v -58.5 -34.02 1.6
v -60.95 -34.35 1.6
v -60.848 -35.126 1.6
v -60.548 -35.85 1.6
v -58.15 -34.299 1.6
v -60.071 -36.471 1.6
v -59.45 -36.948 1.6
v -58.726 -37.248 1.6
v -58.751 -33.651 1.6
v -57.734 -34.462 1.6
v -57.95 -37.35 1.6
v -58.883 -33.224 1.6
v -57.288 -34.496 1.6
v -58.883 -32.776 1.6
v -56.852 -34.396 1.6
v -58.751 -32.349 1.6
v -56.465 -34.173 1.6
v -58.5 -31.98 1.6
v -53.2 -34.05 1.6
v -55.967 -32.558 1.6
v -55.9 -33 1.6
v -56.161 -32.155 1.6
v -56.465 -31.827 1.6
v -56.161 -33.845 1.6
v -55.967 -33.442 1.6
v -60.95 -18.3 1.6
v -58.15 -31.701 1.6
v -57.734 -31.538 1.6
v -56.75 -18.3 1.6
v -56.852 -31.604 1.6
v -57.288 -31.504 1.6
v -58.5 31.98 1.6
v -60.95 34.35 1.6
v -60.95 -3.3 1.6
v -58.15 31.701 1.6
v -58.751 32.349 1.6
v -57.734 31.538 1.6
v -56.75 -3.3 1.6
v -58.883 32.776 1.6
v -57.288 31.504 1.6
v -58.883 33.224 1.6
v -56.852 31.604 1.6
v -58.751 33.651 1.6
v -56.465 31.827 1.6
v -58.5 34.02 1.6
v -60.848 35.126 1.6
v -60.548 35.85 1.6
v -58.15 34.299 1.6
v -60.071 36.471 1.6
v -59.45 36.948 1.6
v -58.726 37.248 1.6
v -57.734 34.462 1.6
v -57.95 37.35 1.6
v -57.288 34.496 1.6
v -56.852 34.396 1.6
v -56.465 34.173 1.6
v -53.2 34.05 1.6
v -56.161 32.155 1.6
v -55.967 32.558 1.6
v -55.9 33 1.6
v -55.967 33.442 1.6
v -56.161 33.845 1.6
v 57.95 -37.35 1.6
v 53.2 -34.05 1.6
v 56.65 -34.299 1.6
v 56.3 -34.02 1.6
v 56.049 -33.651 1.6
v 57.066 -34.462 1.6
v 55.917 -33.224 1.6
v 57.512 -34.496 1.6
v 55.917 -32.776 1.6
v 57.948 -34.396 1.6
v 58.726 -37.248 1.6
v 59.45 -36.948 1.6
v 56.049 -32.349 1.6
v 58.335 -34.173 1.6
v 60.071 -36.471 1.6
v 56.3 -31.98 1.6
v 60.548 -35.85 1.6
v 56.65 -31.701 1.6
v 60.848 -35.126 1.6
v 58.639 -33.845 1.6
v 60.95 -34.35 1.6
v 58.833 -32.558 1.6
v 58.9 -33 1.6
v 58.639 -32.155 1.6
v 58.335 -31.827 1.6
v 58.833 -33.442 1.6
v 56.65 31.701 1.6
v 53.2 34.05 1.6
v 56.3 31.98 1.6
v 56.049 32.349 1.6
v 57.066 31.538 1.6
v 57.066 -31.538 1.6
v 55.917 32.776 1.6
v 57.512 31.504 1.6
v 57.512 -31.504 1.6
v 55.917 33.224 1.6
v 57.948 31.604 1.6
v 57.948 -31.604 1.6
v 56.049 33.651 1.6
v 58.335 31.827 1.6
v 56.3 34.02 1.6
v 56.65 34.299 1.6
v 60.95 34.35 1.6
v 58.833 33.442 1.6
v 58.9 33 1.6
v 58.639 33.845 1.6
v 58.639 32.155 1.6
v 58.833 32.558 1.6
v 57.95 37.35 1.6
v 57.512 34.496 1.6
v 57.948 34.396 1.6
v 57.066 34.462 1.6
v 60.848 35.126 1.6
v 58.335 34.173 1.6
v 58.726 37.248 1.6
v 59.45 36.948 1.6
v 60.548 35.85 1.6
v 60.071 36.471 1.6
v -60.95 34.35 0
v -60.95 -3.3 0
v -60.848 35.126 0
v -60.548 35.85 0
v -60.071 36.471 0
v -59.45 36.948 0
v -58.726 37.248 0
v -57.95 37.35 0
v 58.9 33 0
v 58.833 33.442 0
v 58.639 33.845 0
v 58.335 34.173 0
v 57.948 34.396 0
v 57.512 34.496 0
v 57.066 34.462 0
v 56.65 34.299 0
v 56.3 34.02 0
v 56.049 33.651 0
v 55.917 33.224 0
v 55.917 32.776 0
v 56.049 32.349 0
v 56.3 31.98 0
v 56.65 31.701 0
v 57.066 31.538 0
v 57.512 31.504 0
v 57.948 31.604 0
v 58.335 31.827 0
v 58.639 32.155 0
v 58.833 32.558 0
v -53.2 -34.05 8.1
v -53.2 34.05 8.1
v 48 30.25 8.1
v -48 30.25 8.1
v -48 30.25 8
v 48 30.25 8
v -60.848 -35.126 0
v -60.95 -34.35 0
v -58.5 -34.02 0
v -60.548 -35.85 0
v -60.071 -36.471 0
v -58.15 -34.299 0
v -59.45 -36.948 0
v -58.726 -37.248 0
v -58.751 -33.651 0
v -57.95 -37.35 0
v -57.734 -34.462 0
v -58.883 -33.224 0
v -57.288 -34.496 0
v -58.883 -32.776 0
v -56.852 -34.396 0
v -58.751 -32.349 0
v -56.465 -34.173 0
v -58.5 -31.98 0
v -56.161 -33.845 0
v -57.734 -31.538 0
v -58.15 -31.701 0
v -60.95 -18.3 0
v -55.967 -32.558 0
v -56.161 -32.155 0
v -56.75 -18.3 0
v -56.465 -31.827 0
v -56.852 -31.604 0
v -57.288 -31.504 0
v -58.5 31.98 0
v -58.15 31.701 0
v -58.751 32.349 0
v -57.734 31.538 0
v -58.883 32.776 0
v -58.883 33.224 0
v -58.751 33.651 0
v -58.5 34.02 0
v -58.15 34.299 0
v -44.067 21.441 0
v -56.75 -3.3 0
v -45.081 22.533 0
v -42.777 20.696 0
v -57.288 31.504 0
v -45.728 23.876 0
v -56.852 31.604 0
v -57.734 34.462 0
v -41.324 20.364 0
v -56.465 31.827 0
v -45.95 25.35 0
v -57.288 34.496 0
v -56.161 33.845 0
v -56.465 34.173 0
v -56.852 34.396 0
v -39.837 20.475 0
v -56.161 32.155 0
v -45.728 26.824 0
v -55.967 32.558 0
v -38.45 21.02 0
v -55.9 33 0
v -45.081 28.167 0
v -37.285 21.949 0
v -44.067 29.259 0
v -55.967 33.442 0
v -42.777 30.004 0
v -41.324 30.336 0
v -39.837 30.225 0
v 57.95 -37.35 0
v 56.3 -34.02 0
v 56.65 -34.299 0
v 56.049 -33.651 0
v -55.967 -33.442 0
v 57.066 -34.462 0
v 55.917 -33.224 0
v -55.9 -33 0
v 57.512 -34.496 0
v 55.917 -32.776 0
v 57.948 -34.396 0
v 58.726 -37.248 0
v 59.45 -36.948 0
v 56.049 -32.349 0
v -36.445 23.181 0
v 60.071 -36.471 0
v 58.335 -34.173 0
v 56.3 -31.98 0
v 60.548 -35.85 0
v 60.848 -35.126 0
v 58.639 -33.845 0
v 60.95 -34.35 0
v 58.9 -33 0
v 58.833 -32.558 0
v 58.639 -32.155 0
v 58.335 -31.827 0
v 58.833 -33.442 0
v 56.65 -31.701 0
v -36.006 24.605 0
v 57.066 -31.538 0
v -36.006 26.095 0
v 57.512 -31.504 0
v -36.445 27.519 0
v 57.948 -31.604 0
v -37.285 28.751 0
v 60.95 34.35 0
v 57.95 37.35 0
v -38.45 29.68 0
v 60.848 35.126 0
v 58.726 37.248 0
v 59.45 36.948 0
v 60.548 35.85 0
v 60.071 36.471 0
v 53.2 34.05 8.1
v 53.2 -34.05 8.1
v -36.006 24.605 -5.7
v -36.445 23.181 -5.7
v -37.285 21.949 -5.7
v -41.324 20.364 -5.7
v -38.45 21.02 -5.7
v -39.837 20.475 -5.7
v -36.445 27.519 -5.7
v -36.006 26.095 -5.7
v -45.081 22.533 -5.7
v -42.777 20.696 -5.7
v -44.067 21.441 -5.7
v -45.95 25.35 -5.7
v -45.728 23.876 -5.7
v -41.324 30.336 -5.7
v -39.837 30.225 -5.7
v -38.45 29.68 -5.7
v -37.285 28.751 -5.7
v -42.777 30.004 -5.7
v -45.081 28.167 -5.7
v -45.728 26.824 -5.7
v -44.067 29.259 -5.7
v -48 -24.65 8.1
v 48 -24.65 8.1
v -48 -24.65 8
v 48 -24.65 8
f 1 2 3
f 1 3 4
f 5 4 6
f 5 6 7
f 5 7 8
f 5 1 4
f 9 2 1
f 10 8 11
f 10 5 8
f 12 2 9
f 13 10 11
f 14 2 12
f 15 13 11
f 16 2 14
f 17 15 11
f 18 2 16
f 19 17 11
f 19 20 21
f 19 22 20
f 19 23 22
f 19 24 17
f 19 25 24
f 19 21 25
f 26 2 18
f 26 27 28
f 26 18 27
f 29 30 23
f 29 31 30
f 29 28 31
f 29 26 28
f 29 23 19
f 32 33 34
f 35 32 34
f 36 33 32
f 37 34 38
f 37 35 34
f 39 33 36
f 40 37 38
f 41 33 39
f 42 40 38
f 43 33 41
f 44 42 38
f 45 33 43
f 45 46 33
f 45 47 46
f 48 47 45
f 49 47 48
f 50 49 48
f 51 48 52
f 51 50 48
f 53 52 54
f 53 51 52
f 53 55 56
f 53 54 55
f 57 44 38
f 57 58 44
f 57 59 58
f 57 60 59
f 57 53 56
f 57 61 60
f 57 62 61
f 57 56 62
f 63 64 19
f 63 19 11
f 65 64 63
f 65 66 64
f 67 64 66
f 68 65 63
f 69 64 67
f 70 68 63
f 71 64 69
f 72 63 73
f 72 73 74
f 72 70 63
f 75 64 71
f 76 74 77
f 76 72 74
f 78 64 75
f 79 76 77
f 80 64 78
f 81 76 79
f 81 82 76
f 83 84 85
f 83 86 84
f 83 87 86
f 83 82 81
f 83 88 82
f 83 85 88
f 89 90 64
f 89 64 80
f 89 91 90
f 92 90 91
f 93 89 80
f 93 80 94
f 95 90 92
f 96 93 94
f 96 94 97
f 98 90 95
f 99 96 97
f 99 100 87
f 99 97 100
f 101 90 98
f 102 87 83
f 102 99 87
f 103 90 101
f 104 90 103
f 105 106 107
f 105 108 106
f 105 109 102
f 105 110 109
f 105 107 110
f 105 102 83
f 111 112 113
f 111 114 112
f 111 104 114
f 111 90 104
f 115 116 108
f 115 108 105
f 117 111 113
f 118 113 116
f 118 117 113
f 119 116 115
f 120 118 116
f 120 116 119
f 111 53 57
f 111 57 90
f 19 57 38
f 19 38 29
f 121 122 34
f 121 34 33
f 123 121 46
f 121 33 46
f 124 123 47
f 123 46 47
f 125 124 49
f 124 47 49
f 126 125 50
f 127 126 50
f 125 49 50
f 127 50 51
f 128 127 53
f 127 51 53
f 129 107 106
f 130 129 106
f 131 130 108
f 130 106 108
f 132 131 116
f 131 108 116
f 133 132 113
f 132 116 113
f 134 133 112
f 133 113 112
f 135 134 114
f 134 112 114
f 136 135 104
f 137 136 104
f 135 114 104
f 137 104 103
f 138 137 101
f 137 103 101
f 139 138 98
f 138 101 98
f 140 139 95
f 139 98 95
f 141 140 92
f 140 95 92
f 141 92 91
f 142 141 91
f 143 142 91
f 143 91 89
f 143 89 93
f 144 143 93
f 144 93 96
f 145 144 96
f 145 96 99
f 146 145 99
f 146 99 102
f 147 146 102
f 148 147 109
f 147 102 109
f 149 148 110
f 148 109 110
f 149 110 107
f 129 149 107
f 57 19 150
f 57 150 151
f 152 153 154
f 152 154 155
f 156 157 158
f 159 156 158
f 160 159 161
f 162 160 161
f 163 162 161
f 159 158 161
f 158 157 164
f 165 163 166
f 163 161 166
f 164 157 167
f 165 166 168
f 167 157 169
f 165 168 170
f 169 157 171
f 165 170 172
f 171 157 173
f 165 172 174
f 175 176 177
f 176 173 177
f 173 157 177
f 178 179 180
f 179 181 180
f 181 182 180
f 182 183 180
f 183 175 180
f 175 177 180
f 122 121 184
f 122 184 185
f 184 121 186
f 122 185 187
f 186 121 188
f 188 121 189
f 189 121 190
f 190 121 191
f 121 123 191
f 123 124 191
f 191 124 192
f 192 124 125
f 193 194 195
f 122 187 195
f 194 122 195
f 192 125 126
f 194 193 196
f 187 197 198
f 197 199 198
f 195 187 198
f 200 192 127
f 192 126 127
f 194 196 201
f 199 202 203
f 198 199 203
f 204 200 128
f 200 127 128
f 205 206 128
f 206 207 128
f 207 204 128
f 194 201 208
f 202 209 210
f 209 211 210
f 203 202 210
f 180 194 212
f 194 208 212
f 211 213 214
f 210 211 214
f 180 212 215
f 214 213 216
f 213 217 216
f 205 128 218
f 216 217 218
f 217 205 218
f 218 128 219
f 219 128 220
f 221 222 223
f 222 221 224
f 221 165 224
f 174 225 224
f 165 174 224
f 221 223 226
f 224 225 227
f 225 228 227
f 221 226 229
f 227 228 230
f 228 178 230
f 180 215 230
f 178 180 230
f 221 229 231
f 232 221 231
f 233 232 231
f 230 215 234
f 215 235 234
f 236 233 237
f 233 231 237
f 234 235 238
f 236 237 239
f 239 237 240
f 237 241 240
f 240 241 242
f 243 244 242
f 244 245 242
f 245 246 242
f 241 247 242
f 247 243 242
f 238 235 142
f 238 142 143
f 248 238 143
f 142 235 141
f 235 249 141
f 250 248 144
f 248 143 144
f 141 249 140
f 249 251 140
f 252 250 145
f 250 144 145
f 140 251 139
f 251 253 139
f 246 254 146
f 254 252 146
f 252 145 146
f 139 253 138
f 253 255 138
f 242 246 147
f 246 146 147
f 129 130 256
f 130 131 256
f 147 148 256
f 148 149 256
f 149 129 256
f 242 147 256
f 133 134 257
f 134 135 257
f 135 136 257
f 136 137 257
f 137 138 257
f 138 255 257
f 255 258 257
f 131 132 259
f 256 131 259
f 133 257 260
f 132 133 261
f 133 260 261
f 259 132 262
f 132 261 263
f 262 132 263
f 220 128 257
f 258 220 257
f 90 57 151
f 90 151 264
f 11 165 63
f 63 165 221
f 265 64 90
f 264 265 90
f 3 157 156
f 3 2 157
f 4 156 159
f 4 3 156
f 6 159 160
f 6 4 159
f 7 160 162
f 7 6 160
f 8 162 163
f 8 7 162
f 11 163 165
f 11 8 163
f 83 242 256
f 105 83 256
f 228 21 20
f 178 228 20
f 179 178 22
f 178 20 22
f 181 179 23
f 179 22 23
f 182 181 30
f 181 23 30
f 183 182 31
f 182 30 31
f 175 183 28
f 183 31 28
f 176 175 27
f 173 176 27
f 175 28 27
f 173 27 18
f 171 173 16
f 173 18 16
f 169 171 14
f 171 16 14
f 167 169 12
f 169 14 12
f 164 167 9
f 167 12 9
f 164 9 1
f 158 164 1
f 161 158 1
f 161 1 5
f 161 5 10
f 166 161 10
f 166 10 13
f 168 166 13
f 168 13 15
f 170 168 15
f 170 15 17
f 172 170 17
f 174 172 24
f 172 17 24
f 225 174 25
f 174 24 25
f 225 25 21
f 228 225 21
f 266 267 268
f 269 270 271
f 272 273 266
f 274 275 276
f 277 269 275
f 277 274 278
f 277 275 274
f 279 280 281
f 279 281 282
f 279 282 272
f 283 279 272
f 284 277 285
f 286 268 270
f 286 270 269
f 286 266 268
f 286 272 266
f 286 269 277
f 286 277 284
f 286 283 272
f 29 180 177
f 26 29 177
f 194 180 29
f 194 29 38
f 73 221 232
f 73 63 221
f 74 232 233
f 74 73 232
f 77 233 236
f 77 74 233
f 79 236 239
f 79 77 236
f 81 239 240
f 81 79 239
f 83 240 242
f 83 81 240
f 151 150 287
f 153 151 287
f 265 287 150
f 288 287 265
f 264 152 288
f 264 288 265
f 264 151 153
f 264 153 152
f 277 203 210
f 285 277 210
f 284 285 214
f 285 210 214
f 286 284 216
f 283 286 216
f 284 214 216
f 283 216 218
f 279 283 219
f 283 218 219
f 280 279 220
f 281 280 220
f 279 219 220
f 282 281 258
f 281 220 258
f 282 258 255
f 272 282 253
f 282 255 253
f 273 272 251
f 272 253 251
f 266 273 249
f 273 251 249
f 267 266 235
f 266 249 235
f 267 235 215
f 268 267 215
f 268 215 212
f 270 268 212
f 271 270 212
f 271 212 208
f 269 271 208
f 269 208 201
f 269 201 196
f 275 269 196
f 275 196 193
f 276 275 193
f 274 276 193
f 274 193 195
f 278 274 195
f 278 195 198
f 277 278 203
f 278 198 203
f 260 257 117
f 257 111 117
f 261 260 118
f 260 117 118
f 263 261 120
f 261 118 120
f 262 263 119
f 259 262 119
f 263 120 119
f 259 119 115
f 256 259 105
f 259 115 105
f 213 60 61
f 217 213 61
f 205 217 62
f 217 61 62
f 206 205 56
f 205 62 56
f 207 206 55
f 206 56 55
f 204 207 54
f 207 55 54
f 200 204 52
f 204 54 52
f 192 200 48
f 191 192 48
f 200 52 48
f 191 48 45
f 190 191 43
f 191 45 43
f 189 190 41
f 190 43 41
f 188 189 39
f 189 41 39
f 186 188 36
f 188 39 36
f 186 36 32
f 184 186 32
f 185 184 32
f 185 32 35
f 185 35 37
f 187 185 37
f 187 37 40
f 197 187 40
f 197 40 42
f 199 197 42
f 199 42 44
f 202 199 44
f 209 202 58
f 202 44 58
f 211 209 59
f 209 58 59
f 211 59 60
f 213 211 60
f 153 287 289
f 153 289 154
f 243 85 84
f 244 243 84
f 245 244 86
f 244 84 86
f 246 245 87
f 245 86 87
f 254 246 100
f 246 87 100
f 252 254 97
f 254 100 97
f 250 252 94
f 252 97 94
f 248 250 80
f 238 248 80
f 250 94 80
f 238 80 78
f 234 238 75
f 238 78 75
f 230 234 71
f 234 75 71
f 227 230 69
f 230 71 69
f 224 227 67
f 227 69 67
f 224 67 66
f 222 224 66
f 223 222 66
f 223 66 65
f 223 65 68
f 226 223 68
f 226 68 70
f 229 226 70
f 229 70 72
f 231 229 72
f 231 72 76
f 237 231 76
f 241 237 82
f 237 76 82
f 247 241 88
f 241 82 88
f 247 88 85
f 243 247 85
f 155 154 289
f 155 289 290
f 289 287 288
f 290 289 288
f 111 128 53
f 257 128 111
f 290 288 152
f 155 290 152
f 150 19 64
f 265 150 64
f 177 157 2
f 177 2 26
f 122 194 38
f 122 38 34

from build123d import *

# Parameters (mm, degrees)
SKETCH_1_W          = 121.9
SKETCH_1_H          = 74.7
EXTRUDE_1_DEPTH     = 1.6
SKETCH_2_R          = 1.5
CUT_EXTRUDE_1_DEPTH = 1.6
FILLET_1_R          = 3
SKETCH_3_W          = 106.4
SKETCH_3_H          = 68.1
EXTRUDE_2_DEPTH     = 6.5
SKETCH_4_W          = 96
SKETCH_4_H          = 54.9
CUT_EXTRUDE_2_DEPTH = 0.1
SKETCH_6_W          = 13.573643903
SKETCH_6_H          = 15
CUT_EXTRUDE_3_DEPTH = 9.1
SKETCH_7_R          = 5
EXTRUDE_3_DEPTH     = 5.7


with BuildPart() as part:
    # 草图1 → 凸台-拉伸1 (new body)
    with BuildSketch(Plane.XY):
        Rectangle(SKETCH_1_W, SKETCH_1_H)
    extrude(amount=EXTRUDE_1_DEPTH)

    # 草图2 → 切除-拉伸1 (cut)
    with BuildSketch(Plane.XY.offset(1.6)):
        with Locations((-57.4, 33)):
            Circle(SKETCH_2_R)
        with Locations((-57.4, -33)):
            Circle(SKETCH_2_R)
        with Locations((57.4, -33)):
            Circle(SKETCH_2_R)
        with Locations((57.4, 33)):
            Circle(SKETCH_2_R)
    extrude(amount=-CUT_EXTRUDE_1_DEPTH, mode=Mode.SUBTRACT)

    # 圆角1
    fillet_1_edges = [part.edges().sort_by_distance(p)[0] for p in [
        (60.95, -37.35, 0.8),
        (-60.95, -37.35, 0.8),
        (-60.95, 37.35, 0.8),
        (60.95, 37.35, 0.8),
    ]]
    fillet(fillet_1_edges, radius=FILLET_1_R)

    # 草图3 → 凸台-拉伸2 (add)
    with BuildSketch(Plane.XY.offset(1.6)):
        Rectangle(SKETCH_3_W, SKETCH_3_H)
    extrude(amount=EXTRUDE_2_DEPTH)

    # 草图4 → 切除-拉伸2 (cut)
    with BuildSketch(Plane.XY.offset(8.1)):
        with Locations((0, 2.8)):
            Rectangle(SKETCH_4_W, SKETCH_4_H)
    extrude(amount=-CUT_EXTRUDE_2_DEPTH, mode=Mode.SUBTRACT)

    # 草图6 → 切除-拉伸3 (cut, through all)
    with BuildSketch(Plane(origin=(0, 0, 0), x_dir=(-1, 0, 0), z_dir=(0, 0, -1))):
        with Locations((63.536821952, -10.8)):
            Rectangle(SKETCH_6_W, SKETCH_6_H)
    extrude(amount=-CUT_EXTRUDE_3_DEPTH, mode=Mode.SUBTRACT)

    # 草图7 → 凸台-拉伸3 (add)
    with BuildSketch(Plane(origin=(0, 0, 0), x_dir=(-1, 0, 0), z_dir=(0, 0, -1))):
        with Locations((40.95, 25.35)):
            Circle(SKETCH_7_R)
    extrude(amount=EXTRUDE_3_DEPTH)


solid = part.part
